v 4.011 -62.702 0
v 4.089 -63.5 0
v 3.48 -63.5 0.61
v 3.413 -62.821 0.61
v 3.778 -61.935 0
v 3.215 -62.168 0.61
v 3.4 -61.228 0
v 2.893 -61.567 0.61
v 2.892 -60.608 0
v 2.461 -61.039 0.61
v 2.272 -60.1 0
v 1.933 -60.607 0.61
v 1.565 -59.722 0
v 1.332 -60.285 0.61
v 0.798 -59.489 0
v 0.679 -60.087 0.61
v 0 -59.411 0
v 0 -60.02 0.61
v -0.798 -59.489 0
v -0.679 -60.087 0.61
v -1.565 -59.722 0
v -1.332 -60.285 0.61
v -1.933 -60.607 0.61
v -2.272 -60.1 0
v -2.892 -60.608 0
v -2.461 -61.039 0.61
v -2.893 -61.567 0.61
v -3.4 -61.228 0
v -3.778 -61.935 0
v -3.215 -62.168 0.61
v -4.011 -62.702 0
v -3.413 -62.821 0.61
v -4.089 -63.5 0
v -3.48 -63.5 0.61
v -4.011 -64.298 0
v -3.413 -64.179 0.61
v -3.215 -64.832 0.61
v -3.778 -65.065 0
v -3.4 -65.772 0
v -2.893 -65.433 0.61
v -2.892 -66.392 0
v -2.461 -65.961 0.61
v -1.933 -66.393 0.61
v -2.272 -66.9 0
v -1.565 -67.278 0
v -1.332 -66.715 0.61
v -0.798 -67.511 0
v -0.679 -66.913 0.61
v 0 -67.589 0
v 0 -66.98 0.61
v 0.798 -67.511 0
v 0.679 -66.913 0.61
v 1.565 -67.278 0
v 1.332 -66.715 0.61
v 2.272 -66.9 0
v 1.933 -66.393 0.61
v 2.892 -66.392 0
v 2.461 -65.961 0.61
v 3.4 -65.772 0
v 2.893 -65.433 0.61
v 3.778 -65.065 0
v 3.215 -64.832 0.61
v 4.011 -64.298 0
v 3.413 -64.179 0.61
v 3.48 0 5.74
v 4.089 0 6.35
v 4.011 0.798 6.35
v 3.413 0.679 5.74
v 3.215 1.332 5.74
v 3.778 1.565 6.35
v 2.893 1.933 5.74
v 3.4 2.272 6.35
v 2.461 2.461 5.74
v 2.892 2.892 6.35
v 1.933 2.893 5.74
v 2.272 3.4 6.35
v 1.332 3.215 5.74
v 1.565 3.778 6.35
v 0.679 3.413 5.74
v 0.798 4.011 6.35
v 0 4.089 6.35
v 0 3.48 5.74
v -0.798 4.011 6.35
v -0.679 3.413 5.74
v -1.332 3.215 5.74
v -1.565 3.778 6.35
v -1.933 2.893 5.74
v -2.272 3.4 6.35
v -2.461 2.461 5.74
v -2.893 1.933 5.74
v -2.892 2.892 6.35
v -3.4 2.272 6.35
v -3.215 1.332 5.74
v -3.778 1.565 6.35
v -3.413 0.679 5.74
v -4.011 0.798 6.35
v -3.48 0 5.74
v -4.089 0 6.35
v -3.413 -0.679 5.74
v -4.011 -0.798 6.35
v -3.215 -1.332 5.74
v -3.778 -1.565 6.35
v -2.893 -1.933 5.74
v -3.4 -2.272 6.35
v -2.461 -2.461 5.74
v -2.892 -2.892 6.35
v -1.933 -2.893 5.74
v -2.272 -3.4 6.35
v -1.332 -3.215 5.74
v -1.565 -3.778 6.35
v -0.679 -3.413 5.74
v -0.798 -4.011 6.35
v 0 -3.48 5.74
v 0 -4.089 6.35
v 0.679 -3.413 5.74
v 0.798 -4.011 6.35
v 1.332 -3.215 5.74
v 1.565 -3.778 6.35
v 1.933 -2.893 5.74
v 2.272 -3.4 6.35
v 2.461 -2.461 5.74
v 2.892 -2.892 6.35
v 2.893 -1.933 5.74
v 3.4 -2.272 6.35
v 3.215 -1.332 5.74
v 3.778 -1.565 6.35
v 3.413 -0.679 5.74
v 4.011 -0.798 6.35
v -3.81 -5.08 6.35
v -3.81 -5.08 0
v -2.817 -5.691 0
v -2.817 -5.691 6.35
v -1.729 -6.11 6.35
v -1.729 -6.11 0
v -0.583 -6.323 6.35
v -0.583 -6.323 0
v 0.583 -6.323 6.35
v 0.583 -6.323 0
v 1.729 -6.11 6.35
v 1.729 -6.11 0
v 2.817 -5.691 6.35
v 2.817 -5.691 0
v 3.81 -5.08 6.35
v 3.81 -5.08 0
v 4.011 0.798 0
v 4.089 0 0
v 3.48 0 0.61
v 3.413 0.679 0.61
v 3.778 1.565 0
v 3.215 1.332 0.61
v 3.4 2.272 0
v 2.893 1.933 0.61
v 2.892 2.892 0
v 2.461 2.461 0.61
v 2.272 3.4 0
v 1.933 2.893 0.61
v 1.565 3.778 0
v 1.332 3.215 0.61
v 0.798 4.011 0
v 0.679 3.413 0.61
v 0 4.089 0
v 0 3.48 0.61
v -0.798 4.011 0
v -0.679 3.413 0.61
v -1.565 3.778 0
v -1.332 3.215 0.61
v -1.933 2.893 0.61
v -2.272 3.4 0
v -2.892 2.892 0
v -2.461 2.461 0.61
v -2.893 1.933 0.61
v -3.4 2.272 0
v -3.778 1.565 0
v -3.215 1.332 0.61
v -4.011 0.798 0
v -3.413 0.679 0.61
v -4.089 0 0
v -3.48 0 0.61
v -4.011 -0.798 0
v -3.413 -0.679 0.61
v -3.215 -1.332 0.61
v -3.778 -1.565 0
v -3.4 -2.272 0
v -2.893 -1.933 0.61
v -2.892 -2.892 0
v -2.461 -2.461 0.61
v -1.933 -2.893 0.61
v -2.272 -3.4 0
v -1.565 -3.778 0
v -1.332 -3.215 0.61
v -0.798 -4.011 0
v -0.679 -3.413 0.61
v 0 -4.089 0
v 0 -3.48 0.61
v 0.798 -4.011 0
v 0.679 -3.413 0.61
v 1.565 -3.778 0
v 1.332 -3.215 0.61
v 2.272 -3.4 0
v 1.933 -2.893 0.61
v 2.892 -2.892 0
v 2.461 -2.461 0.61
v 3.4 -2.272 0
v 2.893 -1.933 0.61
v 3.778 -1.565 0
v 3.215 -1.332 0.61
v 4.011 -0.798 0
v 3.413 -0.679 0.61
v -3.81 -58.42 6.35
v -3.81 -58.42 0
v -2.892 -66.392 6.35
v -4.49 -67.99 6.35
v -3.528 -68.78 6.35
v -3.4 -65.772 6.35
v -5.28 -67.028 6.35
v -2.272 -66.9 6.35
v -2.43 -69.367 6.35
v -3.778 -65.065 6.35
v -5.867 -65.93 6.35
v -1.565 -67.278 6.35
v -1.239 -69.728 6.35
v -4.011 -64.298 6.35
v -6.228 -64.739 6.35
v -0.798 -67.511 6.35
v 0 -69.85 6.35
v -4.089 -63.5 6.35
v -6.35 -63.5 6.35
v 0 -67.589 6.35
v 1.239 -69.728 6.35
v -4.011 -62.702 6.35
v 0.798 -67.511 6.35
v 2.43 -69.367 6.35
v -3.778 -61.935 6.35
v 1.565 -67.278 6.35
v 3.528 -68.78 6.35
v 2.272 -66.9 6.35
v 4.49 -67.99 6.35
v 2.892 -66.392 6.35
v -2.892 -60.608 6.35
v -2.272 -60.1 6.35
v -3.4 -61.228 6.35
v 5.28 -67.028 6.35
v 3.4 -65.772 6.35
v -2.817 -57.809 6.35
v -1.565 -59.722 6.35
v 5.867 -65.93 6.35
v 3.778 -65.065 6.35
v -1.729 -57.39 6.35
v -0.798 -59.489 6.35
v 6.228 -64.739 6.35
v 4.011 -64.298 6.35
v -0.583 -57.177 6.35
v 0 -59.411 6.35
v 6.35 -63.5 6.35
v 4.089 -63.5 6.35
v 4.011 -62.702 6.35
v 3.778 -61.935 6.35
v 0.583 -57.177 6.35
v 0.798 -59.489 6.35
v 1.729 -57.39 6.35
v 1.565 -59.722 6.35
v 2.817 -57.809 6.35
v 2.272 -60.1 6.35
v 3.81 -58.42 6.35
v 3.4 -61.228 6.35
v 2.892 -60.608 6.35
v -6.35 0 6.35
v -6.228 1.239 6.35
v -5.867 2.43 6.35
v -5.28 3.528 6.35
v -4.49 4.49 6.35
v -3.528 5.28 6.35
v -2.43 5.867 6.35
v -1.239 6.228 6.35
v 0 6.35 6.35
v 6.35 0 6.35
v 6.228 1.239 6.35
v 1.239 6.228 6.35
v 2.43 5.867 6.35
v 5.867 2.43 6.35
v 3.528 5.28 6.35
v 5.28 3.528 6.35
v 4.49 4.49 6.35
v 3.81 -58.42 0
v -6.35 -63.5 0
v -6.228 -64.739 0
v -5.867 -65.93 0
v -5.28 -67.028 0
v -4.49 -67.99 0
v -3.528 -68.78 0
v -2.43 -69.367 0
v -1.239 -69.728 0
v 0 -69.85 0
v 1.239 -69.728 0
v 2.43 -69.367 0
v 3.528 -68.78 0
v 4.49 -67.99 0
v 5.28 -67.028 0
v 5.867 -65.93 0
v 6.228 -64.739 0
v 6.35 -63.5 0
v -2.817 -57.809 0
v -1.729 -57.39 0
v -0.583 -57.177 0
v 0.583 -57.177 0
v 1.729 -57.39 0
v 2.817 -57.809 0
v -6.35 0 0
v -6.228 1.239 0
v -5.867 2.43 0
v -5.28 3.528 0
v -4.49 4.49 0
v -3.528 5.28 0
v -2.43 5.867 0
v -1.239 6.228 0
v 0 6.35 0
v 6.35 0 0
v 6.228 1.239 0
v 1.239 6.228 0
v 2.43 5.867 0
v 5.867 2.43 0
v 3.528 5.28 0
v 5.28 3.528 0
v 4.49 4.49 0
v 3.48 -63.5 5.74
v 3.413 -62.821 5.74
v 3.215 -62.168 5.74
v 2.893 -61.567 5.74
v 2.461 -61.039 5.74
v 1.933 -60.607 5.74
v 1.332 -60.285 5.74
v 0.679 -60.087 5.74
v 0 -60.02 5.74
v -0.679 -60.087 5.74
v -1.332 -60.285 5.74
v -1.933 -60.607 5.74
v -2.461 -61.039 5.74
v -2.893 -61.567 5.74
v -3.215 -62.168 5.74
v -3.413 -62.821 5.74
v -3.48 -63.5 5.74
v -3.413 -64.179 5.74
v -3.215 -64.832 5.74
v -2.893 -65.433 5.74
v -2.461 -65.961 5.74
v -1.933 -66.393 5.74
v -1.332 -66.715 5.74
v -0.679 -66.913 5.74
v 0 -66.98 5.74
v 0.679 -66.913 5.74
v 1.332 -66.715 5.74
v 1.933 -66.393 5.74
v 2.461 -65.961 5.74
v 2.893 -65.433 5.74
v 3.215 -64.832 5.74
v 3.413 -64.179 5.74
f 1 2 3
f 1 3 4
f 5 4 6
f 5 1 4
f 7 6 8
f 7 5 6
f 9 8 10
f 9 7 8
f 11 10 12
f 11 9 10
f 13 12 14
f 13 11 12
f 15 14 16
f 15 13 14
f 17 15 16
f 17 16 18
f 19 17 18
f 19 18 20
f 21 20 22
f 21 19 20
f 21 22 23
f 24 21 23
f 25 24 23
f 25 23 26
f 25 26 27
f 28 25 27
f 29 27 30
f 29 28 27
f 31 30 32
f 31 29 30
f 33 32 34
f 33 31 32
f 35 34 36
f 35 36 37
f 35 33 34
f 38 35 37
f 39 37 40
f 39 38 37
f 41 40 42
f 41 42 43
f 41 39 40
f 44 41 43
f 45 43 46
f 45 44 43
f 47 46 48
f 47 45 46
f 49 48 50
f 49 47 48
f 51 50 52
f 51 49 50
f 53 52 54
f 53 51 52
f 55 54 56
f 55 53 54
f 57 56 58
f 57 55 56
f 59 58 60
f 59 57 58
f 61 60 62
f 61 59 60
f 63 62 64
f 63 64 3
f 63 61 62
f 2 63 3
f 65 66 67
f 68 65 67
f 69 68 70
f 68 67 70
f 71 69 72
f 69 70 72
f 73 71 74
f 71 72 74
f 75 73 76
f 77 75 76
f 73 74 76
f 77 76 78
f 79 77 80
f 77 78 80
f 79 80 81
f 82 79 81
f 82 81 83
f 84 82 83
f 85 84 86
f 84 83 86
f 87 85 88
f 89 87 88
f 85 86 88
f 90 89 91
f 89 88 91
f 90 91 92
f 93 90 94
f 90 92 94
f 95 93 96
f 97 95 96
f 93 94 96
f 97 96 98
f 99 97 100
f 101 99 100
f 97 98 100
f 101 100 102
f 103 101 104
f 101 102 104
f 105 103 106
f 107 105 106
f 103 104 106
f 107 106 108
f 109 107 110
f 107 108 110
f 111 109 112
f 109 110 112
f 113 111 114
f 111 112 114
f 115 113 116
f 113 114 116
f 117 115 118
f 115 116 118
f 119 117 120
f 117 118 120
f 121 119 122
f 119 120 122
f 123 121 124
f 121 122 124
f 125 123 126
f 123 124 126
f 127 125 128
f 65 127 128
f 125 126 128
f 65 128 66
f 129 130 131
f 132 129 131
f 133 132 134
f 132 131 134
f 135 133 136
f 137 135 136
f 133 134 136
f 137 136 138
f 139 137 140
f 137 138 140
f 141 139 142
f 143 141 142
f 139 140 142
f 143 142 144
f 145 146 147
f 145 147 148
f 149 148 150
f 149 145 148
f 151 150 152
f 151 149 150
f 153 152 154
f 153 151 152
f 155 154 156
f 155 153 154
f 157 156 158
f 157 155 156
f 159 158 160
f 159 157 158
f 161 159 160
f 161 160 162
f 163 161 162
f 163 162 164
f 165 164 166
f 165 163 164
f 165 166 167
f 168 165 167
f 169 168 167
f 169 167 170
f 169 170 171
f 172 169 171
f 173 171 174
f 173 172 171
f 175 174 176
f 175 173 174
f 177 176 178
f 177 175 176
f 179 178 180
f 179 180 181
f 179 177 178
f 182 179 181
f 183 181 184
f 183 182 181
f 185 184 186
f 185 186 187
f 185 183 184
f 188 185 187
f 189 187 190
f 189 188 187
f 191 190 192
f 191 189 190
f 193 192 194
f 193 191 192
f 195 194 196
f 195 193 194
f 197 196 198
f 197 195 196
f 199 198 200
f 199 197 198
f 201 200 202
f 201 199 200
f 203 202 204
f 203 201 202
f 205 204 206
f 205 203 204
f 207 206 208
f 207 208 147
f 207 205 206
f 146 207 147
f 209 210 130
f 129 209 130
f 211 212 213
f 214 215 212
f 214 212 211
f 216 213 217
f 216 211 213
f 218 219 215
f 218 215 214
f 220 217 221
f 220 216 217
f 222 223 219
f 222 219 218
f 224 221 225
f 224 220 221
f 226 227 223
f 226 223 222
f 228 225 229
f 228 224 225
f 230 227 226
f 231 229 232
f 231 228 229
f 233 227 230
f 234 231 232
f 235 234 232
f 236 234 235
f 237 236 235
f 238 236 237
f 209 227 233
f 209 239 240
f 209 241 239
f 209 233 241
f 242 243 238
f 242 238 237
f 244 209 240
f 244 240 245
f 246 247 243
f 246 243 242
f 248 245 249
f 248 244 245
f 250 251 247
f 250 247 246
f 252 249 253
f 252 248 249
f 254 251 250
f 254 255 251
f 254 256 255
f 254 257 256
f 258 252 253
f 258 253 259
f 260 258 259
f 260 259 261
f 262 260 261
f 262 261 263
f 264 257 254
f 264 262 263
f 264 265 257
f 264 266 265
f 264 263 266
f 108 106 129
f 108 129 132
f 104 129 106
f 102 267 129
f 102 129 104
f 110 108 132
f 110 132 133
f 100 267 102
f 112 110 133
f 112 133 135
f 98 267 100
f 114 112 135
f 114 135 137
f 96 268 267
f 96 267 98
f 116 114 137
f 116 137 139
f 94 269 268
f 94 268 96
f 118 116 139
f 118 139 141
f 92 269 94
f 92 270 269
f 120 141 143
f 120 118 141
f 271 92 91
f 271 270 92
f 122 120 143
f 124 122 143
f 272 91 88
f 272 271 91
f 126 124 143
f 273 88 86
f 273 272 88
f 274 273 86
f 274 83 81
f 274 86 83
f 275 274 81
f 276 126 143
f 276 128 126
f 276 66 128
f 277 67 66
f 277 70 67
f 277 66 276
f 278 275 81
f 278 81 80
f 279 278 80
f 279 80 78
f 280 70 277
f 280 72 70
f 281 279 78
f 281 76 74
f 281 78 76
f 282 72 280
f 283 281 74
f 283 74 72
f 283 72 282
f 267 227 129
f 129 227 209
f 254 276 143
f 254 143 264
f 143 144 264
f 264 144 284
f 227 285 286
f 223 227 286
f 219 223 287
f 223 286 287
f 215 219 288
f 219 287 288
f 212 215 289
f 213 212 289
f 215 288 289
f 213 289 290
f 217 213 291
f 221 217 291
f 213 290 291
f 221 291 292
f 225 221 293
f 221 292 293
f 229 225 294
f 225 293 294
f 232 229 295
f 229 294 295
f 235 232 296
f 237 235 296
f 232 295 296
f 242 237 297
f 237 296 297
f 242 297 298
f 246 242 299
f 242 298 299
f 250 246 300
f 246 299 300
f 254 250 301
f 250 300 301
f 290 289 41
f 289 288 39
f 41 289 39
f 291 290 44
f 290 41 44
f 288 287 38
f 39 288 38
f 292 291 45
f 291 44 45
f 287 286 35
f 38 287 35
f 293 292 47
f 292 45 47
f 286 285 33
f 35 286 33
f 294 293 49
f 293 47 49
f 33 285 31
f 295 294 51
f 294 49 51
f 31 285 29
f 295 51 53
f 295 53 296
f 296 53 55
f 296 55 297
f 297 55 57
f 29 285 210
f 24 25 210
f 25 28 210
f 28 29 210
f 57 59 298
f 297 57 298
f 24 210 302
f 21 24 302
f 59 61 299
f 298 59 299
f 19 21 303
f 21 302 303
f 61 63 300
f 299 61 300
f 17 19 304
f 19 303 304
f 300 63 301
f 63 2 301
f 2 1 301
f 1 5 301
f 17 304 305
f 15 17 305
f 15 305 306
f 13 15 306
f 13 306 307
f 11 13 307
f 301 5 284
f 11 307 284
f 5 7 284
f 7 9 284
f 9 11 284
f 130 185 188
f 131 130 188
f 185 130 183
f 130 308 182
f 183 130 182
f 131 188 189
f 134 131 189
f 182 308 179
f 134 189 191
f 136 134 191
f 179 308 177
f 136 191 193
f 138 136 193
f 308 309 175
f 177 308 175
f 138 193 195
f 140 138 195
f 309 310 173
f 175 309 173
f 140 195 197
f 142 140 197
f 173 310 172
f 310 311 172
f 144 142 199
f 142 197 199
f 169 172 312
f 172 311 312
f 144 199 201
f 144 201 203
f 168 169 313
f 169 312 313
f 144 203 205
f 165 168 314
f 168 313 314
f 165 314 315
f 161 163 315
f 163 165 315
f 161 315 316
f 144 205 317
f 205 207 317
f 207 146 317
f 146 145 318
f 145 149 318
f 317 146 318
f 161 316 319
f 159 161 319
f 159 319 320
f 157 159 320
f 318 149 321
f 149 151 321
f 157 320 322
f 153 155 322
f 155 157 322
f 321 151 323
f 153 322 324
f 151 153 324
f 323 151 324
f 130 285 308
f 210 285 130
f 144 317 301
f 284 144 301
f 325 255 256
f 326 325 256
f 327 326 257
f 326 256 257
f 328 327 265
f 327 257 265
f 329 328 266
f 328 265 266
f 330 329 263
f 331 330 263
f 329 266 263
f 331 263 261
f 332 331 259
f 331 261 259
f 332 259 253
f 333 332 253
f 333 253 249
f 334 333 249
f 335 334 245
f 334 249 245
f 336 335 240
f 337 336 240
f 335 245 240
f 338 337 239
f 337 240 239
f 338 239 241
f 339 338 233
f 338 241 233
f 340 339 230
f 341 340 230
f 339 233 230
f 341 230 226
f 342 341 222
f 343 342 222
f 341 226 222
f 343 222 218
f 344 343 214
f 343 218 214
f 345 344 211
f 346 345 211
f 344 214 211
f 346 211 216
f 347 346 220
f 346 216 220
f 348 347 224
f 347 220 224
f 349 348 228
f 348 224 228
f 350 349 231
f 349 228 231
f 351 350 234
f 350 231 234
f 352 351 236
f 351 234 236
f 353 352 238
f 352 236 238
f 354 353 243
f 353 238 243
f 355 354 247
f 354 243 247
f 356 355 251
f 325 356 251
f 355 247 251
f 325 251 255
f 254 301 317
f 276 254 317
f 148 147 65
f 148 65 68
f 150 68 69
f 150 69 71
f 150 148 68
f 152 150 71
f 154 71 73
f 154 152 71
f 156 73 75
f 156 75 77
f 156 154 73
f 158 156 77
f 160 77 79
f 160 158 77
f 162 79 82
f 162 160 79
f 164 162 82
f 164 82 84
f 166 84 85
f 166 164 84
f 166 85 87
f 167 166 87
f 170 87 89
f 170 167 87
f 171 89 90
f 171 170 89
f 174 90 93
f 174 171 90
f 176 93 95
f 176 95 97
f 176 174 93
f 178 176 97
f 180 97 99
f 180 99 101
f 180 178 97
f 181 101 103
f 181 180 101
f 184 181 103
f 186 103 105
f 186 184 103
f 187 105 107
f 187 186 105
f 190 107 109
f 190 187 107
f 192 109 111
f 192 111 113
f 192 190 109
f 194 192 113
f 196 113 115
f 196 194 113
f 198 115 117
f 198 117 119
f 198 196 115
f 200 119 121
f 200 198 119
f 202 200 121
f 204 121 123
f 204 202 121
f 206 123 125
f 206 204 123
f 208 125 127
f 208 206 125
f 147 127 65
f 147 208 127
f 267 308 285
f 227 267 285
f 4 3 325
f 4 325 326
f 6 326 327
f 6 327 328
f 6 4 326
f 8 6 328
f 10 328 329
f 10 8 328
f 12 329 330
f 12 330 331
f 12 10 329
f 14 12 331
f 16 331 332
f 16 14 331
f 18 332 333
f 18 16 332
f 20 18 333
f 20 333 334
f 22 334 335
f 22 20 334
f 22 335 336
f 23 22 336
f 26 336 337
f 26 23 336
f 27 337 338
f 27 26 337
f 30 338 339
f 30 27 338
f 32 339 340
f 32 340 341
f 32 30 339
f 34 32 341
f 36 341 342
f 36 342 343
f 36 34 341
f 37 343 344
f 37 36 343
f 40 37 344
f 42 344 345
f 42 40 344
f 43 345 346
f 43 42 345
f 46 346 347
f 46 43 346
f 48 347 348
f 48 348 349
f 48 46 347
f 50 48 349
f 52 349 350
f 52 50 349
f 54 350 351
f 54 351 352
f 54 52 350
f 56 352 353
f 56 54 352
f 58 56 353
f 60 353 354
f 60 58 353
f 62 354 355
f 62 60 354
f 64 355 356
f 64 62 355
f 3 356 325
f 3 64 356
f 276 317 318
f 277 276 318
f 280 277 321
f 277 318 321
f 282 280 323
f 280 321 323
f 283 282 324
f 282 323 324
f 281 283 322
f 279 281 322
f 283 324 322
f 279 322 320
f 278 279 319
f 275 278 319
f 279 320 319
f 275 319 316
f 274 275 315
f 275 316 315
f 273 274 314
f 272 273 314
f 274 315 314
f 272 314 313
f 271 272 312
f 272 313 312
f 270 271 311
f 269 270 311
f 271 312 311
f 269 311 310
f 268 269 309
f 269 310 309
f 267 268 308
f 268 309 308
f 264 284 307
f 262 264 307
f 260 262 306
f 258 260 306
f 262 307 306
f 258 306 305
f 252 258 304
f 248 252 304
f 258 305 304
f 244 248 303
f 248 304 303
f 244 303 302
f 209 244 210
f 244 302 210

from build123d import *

# Parameters (mm, degrees)
F2_R     = 3.4798
F3_DEPTH = 6.35
F4_SIZE2 = 0.6096
F4_SIZE  = 0.6096


# Not quite as in the source:
# - a variable given as a bare number and used for a length is read in inches; the dataset says mm whatever the document's units were


with BuildPart() as f3:
    # F2 (on Top) → F3 (new body)
    with BuildSketch(Plane.XY):
        with BuildLine():
            ThreePointArc((-3.81, -5.08), (-5.6796126628, -2.8398063314), (-6.35, 0))
            Line((-6.35, 0), (-6.35, -63.5))
            ThreePointArc((-6.35, -63.5), (-5.6796126628, -60.6601936686), (-3.81, -58.42))
            Line((-3.81, -58.42), (-3.81, -5.08))
        make_face()
        with BuildLine():
            ThreePointArc((3.81, -5.08), (5.6796126628, -2.8398063314), (6.35, 0))
            ThreePointArc((6.35, 0), (0, 6.35), (-6.35, 0))
            ThreePointArc((-6.35, 0), (-5.6796126628, -2.8398063314), (-3.81, -5.08))
            ThreePointArc((-3.81, -5.08), (0, -6.35), (3.81, -5.08))
        make_face()
        Circle(F2_R, mode=Mode.SUBTRACT)
        with BuildLine():
            Line((6.35, -63.5), (6.35, 0))
            ThreePointArc((6.35, 0), (5.6796126628, -2.8398063314), (3.81, -5.08))
            Line((3.81, -5.08), (3.81, -58.42))
            ThreePointArc((3.81, -58.42), (5.6796126628, -60.6601936686), (6.35, -63.5))
        make_face()
        with BuildLine():
            ThreePointArc((-6.35, -63.5), (0, -69.85), (6.35, -63.5))
            ThreePointArc((6.35, -63.5), (5.6796126628, -60.6601936686), (3.81, -58.42))
            ThreePointArc((3.81, -58.42), (0, -57.15), (-3.81, -58.42))
            ThreePointArc((-3.81, -58.42), (-5.6796126628, -60.6601936686), (-6.35, -63.5))
        make_face()
        with Locations((0, -63.5)):
            Circle(F2_R, mode=Mode.SUBTRACT)
    extrude(amount=F3_DEPTH)

    # F4
    f4_edges = [f3.edges().sort_by_distance(p)[0] for p in [
        (-3.4798, 0, 6.35),
        (-3.4798, -63.5, 6.35),
        (-3.4798, 0, 0),
        (-3.4798, -63.5, 0),
    ]]
    chamfer(f4_edges, length=F4_SIZE, length2=F4_SIZE2)


solid = f3.part
